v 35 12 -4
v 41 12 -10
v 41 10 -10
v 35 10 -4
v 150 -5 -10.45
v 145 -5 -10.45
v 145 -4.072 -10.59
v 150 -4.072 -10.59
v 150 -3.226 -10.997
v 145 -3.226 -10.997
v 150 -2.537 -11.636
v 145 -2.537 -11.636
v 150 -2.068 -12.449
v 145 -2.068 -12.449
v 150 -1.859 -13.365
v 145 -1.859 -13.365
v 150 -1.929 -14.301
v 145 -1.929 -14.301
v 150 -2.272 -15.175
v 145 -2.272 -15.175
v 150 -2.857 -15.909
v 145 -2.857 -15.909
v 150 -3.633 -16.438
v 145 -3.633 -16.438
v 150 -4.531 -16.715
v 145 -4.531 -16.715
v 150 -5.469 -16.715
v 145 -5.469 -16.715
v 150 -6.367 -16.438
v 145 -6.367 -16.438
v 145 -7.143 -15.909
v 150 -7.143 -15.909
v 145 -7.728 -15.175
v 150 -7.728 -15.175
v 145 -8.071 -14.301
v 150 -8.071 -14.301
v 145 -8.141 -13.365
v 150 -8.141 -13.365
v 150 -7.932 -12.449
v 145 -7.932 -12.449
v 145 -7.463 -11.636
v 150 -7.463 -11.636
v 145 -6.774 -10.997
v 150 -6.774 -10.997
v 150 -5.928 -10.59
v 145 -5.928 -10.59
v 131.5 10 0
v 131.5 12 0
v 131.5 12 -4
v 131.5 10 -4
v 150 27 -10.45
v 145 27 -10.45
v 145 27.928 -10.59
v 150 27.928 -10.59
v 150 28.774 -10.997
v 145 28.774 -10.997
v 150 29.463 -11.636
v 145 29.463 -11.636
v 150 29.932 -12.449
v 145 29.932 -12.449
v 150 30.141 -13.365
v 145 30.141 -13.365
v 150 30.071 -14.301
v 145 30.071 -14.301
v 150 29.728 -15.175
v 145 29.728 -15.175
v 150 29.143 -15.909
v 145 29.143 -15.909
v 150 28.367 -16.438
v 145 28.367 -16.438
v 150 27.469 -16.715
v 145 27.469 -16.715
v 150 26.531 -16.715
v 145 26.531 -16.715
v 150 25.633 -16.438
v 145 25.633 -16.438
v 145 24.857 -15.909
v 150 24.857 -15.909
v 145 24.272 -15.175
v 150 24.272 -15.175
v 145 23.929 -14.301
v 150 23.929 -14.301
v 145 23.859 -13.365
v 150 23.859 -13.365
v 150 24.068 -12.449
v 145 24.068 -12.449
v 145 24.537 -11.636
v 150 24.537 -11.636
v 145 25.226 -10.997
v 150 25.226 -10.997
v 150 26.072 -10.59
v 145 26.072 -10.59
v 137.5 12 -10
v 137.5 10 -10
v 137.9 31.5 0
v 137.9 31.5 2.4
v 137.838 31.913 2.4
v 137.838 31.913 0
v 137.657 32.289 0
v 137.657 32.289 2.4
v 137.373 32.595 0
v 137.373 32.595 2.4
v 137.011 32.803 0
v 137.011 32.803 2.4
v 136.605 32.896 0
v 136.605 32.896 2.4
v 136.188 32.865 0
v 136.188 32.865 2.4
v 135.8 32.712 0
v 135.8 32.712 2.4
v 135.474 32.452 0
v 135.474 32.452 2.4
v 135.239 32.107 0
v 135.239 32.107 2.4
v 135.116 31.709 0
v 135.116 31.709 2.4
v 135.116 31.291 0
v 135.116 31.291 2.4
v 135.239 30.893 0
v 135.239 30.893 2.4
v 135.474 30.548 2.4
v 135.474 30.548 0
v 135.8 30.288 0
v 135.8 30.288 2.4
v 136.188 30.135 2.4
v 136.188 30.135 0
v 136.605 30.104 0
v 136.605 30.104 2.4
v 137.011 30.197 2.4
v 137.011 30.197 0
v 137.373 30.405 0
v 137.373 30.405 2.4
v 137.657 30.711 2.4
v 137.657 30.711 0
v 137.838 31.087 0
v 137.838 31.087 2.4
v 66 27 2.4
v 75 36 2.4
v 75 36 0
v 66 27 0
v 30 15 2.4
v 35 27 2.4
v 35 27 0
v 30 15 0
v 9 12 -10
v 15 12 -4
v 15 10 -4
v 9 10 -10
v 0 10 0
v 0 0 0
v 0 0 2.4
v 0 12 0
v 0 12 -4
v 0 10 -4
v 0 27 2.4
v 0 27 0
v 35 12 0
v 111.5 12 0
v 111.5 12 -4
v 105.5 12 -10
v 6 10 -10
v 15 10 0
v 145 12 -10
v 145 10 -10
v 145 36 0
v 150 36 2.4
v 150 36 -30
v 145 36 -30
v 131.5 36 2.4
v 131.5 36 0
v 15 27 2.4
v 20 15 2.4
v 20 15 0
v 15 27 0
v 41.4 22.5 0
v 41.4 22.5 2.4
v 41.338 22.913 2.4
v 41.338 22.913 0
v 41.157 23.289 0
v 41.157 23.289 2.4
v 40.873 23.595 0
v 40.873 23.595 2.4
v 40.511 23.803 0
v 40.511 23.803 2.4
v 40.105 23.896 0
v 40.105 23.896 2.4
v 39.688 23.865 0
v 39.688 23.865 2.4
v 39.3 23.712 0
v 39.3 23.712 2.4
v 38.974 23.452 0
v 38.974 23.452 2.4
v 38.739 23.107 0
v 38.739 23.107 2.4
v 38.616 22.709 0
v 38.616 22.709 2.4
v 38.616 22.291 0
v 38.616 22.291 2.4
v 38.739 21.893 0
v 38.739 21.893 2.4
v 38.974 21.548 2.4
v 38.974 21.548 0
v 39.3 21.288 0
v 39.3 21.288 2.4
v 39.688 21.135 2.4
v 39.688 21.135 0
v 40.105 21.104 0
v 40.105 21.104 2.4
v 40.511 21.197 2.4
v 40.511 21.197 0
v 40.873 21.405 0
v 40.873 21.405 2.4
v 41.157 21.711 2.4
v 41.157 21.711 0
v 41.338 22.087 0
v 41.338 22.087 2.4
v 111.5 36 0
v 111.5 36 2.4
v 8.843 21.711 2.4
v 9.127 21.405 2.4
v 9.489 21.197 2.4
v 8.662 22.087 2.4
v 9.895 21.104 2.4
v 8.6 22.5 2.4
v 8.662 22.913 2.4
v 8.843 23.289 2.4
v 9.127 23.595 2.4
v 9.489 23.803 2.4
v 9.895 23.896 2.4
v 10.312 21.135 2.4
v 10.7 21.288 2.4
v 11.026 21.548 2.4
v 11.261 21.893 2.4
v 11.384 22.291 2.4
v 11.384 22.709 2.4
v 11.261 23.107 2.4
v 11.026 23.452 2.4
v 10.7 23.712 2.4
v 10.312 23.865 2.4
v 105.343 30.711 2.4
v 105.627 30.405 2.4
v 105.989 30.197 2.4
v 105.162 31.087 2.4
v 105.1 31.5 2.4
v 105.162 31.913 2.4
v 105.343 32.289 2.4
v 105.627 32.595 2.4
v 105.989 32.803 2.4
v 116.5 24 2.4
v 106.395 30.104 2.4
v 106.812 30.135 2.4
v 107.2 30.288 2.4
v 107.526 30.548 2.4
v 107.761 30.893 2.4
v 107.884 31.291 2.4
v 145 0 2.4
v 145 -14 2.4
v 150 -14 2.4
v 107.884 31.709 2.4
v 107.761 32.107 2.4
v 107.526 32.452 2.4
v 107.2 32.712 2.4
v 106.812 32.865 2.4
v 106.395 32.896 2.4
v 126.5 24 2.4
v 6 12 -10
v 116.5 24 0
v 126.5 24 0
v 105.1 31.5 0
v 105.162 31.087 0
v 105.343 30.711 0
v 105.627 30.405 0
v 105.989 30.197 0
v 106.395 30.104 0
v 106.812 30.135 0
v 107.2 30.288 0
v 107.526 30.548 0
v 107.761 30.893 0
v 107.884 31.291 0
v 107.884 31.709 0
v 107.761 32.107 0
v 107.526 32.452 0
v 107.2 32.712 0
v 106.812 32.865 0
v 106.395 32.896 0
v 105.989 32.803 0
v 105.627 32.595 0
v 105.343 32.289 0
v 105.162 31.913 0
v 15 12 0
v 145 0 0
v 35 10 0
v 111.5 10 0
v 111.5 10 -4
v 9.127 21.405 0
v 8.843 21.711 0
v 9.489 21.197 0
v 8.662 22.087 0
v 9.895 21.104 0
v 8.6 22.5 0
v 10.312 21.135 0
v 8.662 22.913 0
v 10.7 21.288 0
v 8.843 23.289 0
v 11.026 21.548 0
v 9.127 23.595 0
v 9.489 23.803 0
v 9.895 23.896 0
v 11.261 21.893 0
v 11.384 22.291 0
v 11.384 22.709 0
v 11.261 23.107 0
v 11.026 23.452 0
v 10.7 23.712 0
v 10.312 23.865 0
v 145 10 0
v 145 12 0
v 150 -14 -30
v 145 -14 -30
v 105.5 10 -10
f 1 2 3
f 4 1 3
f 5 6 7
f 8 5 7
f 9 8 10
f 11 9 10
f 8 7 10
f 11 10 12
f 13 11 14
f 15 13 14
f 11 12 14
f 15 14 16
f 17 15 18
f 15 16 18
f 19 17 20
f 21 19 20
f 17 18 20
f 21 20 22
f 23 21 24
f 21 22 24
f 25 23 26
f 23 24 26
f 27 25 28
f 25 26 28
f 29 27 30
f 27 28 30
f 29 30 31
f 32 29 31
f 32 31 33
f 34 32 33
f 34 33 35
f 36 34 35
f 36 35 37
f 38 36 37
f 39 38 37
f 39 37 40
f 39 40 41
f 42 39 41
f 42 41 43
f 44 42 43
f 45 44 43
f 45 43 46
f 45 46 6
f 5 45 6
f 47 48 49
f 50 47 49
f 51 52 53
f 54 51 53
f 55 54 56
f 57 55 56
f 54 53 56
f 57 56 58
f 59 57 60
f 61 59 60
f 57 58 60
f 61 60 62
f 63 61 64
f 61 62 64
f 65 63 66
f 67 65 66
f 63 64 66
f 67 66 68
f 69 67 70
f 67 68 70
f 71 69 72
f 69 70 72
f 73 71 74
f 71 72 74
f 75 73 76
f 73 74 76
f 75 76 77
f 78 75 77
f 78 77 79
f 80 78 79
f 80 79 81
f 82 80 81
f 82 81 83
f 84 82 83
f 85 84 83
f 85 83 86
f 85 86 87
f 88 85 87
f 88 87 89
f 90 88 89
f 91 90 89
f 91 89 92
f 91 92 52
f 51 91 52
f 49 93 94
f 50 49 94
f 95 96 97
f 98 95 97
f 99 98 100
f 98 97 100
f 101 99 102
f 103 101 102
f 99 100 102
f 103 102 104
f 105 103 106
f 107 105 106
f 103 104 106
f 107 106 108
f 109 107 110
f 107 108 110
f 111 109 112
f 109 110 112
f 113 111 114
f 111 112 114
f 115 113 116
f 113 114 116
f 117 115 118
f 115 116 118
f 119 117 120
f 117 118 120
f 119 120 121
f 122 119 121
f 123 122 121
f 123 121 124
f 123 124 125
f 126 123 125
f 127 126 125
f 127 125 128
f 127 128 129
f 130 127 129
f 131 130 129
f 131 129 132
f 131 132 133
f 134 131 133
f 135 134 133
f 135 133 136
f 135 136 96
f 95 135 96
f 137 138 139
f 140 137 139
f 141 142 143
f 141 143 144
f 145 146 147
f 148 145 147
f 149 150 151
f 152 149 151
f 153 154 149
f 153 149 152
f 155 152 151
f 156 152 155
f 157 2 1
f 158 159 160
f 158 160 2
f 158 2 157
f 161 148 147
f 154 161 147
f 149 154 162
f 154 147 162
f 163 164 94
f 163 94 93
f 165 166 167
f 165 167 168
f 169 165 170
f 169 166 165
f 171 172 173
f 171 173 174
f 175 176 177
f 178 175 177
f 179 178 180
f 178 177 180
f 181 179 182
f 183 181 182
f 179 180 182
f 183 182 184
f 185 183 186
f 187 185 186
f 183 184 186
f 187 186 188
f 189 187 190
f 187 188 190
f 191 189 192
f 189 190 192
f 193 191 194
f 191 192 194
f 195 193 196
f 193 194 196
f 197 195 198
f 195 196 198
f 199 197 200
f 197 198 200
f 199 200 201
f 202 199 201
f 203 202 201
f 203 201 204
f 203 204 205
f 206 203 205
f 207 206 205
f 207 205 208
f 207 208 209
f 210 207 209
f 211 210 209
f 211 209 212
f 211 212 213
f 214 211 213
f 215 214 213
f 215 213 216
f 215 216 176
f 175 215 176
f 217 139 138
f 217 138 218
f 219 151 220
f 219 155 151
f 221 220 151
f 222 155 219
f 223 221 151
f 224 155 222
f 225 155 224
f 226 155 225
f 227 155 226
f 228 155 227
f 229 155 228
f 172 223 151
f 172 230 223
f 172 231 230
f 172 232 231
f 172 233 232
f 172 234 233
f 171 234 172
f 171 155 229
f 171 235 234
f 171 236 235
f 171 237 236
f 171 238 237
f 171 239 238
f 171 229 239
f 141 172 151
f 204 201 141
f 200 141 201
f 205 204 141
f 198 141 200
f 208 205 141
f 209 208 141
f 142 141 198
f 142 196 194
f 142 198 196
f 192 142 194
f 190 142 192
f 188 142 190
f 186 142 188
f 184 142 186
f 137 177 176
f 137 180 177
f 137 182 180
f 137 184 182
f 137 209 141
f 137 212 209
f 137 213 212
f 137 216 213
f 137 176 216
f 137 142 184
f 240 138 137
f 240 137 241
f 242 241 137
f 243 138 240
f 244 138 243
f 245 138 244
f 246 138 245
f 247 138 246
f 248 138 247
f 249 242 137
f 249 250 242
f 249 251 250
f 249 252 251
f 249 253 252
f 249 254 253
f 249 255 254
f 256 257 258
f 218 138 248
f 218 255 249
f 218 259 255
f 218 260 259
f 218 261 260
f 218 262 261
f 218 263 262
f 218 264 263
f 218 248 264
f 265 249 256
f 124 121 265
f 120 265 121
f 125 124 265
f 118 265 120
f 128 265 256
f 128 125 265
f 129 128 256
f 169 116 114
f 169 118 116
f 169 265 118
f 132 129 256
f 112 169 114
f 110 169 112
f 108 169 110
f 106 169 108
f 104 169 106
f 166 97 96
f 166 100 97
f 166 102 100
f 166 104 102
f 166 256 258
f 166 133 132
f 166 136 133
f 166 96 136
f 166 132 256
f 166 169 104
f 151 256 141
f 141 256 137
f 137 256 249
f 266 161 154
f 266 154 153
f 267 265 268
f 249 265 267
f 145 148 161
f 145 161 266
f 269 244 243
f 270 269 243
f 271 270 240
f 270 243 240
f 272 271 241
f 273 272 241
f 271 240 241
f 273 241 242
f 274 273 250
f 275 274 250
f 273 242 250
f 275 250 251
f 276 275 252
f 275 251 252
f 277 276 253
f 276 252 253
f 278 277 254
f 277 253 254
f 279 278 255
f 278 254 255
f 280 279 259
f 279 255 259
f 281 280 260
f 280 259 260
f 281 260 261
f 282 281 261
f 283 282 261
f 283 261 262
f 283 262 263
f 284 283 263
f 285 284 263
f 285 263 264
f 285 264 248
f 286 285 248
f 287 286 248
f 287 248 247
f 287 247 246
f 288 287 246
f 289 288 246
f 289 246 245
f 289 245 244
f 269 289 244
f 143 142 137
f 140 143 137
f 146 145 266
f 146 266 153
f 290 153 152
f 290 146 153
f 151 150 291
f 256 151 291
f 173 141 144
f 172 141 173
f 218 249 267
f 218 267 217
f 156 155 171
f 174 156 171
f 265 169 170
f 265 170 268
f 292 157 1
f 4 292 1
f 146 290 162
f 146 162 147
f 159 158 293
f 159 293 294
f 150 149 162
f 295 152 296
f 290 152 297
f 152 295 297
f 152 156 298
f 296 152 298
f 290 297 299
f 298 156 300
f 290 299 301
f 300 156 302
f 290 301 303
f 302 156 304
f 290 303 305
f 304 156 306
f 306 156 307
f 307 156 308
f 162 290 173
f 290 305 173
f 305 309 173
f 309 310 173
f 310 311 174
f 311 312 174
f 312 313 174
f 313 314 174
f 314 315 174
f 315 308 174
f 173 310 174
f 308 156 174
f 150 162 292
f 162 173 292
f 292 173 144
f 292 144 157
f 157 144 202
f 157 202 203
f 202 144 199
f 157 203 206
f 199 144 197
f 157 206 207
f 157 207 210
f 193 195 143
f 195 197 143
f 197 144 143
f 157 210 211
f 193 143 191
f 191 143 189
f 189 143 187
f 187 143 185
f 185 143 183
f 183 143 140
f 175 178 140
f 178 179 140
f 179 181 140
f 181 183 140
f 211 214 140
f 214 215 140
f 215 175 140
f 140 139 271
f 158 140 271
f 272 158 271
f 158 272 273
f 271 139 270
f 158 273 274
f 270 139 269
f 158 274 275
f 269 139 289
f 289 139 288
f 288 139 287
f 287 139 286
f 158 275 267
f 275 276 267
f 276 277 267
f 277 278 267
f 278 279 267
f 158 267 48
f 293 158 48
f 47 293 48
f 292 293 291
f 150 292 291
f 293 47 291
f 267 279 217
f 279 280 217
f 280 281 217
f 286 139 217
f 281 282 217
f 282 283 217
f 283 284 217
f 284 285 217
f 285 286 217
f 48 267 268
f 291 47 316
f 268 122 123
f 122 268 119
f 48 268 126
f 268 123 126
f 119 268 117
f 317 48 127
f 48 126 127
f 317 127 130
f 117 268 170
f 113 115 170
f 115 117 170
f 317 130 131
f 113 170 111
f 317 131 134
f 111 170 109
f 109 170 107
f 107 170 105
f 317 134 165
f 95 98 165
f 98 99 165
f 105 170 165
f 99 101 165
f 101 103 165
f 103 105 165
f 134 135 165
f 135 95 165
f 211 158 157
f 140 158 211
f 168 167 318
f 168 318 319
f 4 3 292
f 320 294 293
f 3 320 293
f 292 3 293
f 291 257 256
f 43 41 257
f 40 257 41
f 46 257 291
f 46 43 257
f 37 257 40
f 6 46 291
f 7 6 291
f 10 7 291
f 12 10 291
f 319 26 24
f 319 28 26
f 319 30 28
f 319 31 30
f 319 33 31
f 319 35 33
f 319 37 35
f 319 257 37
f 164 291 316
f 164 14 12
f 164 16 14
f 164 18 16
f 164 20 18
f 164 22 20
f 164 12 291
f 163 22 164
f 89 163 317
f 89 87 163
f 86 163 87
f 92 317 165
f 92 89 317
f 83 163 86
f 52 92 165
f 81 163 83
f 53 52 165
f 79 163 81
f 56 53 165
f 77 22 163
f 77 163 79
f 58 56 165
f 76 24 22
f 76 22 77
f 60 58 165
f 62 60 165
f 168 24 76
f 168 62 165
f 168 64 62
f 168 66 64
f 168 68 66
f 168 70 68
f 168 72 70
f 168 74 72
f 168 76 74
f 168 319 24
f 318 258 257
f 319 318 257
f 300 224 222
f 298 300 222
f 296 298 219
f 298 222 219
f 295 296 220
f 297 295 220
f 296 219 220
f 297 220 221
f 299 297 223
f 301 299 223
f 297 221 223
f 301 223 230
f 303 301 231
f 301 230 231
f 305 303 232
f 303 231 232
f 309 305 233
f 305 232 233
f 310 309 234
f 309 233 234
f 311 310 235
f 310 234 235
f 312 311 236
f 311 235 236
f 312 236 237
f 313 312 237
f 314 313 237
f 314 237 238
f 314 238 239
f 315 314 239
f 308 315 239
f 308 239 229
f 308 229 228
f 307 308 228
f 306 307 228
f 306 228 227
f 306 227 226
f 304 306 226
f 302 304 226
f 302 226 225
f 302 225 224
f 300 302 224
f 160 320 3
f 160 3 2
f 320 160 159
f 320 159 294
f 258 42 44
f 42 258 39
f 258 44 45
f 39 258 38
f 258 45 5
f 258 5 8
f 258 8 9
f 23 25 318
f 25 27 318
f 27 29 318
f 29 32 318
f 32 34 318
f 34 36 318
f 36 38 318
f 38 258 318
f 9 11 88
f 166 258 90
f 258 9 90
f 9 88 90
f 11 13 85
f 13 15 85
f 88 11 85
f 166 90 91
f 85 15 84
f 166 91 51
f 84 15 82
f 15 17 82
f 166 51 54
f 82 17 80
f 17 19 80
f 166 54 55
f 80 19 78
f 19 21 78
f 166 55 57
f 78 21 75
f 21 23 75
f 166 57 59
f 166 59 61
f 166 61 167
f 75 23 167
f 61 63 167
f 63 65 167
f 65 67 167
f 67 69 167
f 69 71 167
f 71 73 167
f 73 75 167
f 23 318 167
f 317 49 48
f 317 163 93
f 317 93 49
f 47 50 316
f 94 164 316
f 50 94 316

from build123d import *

# Parameters (mm, degrees)
SKETCH1_W                       = 150
SKETCH1_H                       = 36
BOSS_EXTRUDE1_DEPTH             = 2.4
SKETCH10_W                      = 75
SKETCH10_H                      = 9
CUT_EXTRUDE5_DEPTH              = 10
SKETCH2_R                       = 1.4
CUT_EXTRUDE1_DEPTH              = 155.278190293
CHAMFER6_SIZE                   = 9
SKETCH3_W                       = 5
SKETCH3_H                       = 50
BOSS_EXTRUDE2_DEPTH             = 30
BOSS_EXTRUDE2_DIRECTION_2_REACH = 156.278
SKETCH4_R                       = 3.15
CUT_EXTRUDE2_DEPTH              = 30
SKETCH8_W                       = 10
SKETCH8_H                       = 2
BOSS_EXTRUDE4_DEPTH             = 145
SKETCH9_W                       = 20
SKETCH9_H                       = 12.540874848
SKETCH9_H_2                     = 13.006860614
CUT_EXTRUDE4_DEPTH              = 161.934769394
CHAMFER5_SIZE                   = 6


with BuildPart() as part:
    # Sketch1 → Boss-Extrude1 (new body)
    with BuildSketch(Plane.XY):
        with Locations((75, 18)):
            Rectangle(SKETCH1_W, SKETCH1_H)
    extrude(amount=BOSS_EXTRUDE1_DEPTH)

    # Sketch10 → Cut-Extrude5 (cut)
    with BuildSketch(Plane.XY.offset(2.4)):
        with Locations((37.5, 31.5)):
            Rectangle(SKETCH10_W, SKETCH10_H)
    extrude(amount=-CUT_EXTRUDE5_DEPTH, mode=Mode.SUBTRACT)

    # Sketch2 → Cut-Extrude1 (cut, through all)
    with BuildSketch(Plane.XY.offset(2.4)):
        with Locations((40, 22.5)):
            Circle(SKETCH2_R)
        with Locations(Location((10, 22.5, 0), (0, 0, 180))):
            Circle(SKETCH2_R)
        with Locations(Location((106.5, 31.5, 0), (0, 0, 180))):
            Circle(SKETCH2_R)
        with Locations((136.5, 31.5)):
            Circle(SKETCH2_R)
        Polygon((131.5, 36), (126.5, 24), (116.5, 24), (111.5, 36), align=None)
        Polygon((35, 27), (30, 15), (20, 15), (15, 27), align=None)
    extrude(amount=-CUT_EXTRUDE1_DEPTH, mode=Mode.SUBTRACT)

    # Chamfer6
    chamfer6_edges = [part.edges().sort_by_distance(p)[0] for p in [
        (75, 27, 1.2),
    ]]
    chamfer(chamfer6_edges, length=CHAMFER6_SIZE - 0.0001)  # a hair under: the kernel refuses the full size

    # Sketch3 → Boss-Extrude2 (add)
    with BuildSketch(Plane(origin=(0, 0, 0), x_dir=(-1, 0, 0), z_dir=(0, 0, -1))):
        with Locations((-147.5, 11)):
            Rectangle(SKETCH3_W, SKETCH3_H)
    extrude(amount=BOSS_EXTRUDE2_DEPTH)

    # Boss-Extrude2 direction 2: up to this face of the body (flat: up to its plane)
    boss_extrude2_direction_2_end = Plane(part.part.faces().sort_by_distance((80.903875834, 15.309167909, 2.4))[0])
    # Sketch3 → Boss-Extrude2 direction 2 (add, up to the picked face)
    with BuildSketch(Plane(origin=(0, 0, 0), x_dir=(-1, 0, 0), z_dir=(0, 0, -1)), mode=Mode.PRIVATE) as boss_extrude2_direction_2_sk1:
        with Locations((-147.5, 11)):
            Rectangle(SKETCH3_W, SKETCH3_H)
    boss_extrude2_direction_2_tool1 = split(extrude(boss_extrude2_direction_2_sk1.sketch, amount=-BOSS_EXTRUDE2_DIRECTION_2_REACH, mode=Mode.PRIVATE), bisect_by=boss_extrude2_direction_2_end, keep=Keep.BOTH, mode=Mode.PRIVATE)
    add(boss_extrude2_direction_2_tool1.solids().sort_by(Axis((147.5, 11, 0), (0, 0, 1)))[0])

    # Sketch4 → Cut-Extrude2 (cut)
    with BuildSketch(Plane.ZY.offset(-145)):
        with Locations((-13.6, 27)):
            Circle(SKETCH4_R)
        with Locations((-13.6, -5)):
            Circle(SKETCH4_R)
    extrude(amount=-CUT_EXTRUDE2_DEPTH, mode=Mode.SUBTRACT)

    # Sketch8 → Boss-Extrude4 (add)
    with BuildSketch(Plane.ZY.offset(-145)):
        with Locations((-5, 11)):
            Rectangle(SKETCH8_W, SKETCH8_H)
    extrude(amount=BOSS_EXTRUDE4_DEPTH)

    # Sketch9 → Cut-Extrude4 (cut, through all)
    with BuildSketch(Plane(origin=(0, 36, 0), x_dir=(1, 0, 0), z_dir=(0, 1, 0))):
        with Locations((121.5, 6.270437424)):
            Rectangle(SKETCH9_W, SKETCH9_H)
        with Locations((25, 6.503430307)):
            Rectangle(SKETCH9_W, SKETCH9_H_2)
    extrude(amount=-CUT_EXTRUDE4_DEPTH, mode=Mode.SUBTRACT)

    # Chamfer5
    chamfer5_edges = [part.edges().sort_by_distance(p)[0] for p in [
        (0, 11, -10),
        (111.5, 11, -10),
        (131.5, 11, -10),
        (15, 11, -10),
        (35, 11, -10),
    ]]
    chamfer(chamfer5_edges, length=CHAMFER5_SIZE)


solid = part.part
